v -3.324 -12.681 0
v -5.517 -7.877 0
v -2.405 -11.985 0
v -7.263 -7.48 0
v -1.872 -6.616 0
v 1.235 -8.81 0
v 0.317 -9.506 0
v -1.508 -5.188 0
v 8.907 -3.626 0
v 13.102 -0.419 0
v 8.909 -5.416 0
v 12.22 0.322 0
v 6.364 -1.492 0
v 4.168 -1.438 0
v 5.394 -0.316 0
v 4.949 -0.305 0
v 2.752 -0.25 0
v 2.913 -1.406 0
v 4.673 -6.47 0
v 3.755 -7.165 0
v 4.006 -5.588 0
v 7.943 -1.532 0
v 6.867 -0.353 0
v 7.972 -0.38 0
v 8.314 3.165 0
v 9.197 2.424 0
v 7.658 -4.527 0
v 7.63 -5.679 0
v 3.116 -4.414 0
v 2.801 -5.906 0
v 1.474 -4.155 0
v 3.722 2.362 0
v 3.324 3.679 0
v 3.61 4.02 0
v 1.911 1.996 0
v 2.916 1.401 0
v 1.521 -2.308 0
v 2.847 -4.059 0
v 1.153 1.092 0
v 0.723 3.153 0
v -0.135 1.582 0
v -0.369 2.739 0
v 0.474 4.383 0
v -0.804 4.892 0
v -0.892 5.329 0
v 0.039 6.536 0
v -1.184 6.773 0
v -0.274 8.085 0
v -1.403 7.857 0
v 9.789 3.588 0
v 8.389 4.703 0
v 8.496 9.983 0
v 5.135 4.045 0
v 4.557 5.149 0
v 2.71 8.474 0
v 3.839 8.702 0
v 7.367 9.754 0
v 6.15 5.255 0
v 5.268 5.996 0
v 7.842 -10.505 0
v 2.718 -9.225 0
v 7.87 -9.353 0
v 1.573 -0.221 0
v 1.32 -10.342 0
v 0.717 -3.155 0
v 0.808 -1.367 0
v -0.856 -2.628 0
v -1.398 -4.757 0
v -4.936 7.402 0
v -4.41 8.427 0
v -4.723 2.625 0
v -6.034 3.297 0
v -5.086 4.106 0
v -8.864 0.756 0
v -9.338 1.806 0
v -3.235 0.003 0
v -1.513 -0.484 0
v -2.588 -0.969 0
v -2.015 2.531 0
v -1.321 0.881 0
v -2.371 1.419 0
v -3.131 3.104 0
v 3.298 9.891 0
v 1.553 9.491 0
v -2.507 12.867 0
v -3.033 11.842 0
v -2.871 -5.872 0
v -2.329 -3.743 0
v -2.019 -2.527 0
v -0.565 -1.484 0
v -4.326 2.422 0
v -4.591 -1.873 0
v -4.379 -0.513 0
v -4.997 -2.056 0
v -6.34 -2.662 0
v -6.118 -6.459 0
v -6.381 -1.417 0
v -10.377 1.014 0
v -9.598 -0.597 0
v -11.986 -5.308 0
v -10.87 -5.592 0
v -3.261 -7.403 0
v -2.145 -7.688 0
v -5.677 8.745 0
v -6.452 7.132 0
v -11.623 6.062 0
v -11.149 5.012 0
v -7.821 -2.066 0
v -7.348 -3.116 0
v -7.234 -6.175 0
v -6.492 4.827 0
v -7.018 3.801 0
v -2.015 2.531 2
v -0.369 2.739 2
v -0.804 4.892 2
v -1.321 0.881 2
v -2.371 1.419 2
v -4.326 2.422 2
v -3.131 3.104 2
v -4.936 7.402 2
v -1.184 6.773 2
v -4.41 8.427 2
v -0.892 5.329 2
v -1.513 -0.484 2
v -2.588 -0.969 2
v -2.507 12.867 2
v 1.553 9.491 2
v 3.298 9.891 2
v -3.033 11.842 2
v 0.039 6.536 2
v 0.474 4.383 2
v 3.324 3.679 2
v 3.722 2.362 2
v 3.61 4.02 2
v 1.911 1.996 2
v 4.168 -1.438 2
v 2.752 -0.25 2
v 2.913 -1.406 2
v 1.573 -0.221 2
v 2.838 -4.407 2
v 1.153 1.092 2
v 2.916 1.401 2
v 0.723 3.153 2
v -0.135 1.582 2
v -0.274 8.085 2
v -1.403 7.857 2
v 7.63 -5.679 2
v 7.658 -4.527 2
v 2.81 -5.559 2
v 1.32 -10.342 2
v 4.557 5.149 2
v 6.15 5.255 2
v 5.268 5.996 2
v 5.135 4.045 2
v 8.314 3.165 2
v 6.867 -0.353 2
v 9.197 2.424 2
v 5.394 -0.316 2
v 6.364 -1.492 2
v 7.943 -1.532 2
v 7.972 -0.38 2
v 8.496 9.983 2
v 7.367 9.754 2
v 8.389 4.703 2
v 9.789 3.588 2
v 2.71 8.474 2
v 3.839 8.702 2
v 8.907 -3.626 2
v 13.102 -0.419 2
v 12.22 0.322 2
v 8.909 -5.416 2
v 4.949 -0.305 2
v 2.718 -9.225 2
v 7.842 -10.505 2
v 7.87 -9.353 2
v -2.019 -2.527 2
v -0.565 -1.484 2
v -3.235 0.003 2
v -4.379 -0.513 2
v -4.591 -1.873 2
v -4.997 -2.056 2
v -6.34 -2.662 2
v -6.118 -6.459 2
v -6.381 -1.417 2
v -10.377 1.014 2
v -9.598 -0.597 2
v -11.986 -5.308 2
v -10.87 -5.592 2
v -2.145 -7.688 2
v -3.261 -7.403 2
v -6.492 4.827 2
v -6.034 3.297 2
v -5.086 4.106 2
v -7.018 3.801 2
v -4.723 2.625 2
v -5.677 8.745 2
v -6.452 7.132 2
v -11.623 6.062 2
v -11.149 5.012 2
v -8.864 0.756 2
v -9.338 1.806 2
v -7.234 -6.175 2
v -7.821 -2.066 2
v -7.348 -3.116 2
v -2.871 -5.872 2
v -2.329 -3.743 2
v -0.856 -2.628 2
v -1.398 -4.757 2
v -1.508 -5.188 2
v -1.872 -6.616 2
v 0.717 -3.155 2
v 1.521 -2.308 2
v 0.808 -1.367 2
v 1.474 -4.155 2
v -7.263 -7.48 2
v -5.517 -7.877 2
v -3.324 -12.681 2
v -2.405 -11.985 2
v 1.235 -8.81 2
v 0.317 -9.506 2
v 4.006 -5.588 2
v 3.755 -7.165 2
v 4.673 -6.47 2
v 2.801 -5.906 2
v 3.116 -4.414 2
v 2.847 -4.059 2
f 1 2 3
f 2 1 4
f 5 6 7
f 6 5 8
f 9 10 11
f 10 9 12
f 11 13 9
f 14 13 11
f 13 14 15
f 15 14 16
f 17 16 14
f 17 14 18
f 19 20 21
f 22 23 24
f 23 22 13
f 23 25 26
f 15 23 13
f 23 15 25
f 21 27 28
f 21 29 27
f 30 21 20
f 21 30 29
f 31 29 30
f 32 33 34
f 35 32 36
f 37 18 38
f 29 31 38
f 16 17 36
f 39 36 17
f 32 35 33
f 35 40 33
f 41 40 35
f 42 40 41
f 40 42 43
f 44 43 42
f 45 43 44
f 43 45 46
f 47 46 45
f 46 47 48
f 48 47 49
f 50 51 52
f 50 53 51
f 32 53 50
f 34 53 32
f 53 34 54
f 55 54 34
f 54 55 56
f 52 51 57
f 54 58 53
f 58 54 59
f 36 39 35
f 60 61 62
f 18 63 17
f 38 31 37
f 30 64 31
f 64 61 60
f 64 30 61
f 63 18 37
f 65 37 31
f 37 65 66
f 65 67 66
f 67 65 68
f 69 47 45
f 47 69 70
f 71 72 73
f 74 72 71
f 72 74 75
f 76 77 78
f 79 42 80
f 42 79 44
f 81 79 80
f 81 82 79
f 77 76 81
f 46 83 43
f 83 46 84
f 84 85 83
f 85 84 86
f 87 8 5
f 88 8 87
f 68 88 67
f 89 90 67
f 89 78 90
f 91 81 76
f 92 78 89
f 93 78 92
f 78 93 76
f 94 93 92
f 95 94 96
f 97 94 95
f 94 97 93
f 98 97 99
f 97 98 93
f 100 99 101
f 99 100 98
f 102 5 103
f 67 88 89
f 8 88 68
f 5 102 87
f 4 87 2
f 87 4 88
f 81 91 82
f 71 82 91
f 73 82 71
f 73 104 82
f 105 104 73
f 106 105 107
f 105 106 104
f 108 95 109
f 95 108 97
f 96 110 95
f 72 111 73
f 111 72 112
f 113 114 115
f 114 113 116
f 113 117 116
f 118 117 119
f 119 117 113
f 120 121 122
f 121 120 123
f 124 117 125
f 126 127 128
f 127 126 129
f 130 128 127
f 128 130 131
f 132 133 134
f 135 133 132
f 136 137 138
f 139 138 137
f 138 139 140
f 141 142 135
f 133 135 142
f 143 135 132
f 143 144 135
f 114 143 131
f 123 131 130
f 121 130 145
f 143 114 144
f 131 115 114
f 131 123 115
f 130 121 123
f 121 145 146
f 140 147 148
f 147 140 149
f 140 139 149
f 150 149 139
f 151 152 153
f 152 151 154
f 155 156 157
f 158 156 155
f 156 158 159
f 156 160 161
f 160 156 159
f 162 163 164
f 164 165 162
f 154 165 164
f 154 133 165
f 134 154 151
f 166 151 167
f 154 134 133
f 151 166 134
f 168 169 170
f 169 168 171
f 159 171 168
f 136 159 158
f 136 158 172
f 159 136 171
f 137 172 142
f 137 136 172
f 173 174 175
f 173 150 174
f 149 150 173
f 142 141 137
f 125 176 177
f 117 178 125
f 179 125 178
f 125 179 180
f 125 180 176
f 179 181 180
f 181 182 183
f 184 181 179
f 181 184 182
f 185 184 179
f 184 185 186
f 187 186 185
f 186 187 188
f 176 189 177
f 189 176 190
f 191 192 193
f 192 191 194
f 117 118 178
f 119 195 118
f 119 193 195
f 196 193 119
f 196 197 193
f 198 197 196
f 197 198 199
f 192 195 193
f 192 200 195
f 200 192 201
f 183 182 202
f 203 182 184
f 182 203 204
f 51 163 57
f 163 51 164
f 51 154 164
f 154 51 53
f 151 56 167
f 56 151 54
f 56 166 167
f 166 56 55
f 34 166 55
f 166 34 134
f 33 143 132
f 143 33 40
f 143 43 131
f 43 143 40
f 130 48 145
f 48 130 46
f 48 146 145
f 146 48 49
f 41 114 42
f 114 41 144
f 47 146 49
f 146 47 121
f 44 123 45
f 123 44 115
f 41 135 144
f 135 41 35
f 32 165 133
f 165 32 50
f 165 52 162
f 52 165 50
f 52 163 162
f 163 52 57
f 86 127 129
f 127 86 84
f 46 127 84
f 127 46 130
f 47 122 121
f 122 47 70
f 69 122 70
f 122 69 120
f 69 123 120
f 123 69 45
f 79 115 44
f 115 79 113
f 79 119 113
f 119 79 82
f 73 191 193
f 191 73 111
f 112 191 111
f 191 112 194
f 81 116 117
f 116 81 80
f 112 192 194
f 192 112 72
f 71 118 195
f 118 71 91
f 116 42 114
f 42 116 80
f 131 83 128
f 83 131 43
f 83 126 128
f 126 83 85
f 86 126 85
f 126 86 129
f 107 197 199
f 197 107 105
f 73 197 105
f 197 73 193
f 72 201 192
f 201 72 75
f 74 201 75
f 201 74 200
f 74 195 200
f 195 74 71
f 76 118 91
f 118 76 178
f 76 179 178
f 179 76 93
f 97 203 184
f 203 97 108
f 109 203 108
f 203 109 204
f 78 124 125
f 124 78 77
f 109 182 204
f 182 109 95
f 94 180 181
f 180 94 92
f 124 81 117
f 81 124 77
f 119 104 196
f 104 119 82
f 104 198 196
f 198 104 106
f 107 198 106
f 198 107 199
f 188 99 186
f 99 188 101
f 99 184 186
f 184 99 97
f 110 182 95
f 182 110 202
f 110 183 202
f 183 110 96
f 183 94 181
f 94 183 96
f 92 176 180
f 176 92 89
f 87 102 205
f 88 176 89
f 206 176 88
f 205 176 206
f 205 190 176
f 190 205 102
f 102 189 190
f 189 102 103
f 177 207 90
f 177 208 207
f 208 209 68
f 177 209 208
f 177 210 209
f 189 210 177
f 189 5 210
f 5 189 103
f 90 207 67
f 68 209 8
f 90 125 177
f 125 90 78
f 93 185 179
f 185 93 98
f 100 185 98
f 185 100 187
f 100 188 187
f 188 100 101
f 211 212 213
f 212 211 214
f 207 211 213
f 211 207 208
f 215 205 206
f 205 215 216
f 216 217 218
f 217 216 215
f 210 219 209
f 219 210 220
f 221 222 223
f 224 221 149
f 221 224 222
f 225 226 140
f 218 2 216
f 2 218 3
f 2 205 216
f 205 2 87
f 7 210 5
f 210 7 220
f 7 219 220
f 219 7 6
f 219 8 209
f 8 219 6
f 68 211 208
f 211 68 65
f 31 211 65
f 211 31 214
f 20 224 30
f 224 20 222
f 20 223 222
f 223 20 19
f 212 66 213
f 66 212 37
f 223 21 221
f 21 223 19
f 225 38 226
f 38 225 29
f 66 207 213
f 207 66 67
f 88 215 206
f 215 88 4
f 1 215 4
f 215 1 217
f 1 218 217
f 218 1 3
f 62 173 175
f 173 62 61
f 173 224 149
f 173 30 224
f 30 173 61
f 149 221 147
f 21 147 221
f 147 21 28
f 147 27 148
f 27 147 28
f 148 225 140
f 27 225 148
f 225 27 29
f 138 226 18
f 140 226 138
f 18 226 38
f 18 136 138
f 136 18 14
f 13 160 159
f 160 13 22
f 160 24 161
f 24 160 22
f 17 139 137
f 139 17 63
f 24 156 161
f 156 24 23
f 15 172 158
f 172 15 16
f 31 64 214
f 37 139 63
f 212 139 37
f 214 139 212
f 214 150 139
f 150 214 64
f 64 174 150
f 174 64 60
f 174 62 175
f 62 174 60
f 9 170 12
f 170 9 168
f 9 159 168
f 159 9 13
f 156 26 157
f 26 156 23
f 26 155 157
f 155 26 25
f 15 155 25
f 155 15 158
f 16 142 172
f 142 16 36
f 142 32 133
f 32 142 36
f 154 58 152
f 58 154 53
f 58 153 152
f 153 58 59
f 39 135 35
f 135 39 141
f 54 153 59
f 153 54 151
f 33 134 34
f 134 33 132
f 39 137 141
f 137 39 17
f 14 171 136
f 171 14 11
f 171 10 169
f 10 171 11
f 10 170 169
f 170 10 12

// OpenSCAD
// use your initial(s)
text_to_use = "E";

// how many times your letter(s) should be used - the more parts, the more innerspace you will need!
parts = 7; // [1:36]
rotation = 360/parts;

// how thick should it be?
thickness = 2; // [1:10]

// move the letters to/from the inner point
inner_space = 70; // [-100:200]

// rotate the letters - try at least 0 and 90
inner_rotate = 50; // [-180:180]

// what font do you like? https://fonts.google.com/
fonttype = "Miltonian"; // [ABeeZee, Abel, Abhaya Libre, Abril Fatface, Aclonica, Acme, Actor, Adamina, Advent Pro, Aguafina Script, Akronim, Aladin, Aldrich, Alef, Alegreya, Alegreya Sans, Alegreya Sans SC, Alegreya SC, Alex Brush, Alfa Slab One, Alice, Alike, Alike Angular, Allan, Allerta, Allerta Stencil, Allura, Almendra, Almendra Display, Almendra SC, Amarante, Amaranth, Amatic SC, Amatica SC, Amethysta, Amiko, Amiri, Amita, Anaheim, Andada, Andika, Angkor, Annie Use Your Telescope, Anonymous Pro, Antic, Antic Didone, Antic Slab, Anton, Arapey, Arbutus, Arbutus Slab, Architects Daughter, Archivo, Archivo Black, Archivo Narrow, Aref Ruqaa, Arima Madurai, Arimo, Arizonia, Armata, Arsenal, Artifika, Arvo, Arya, Asap, Asap Condensed, Asar, Asset, Assistant, Astloch, Asul, Athiti, Atma, Atomic Age, Aubrey, Audiowide, Autour One, Average, Average Sans, Averia Gruesa Libre, Averia Libre, Averia Sans Libre, Averia Serif Libre, Bad Script, Bahiana, Baloo, Baloo Bhai, Baloo Bhaijaan, Baloo Bhaina, Baloo Chettan, Baloo Da, Baloo Paaji, Baloo Tamma, Baloo Tammudu, Baloo Thambi, Balthazar, Bangers, Barrio, Basic, Battambang, Baumans, Bayon, Belgrano, Bellefair, Belleza, BenchNine, Bentham, Berkshire Swash, Bevan, Bigelow Rules, Bigshot One, Bilbo, Bilbo Swash Caps, BioRhyme, BioRhyme Expanded, Biryani, Bitter, Black Ops One, Bokor, Bonbon, Boogaloo, Bowlby One, Bowlby One SC, Brawler, Bree Serif, Bubblegum Sans, Bubbler One, Buda, Buenard, Bungee, Bungee Hairline, Bungee Inline, Bungee Outline, Bungee Shade, Butcherman, Butterfly Kids, Cabin, Cabin Condensed, Cabin Sketch, Caesar Dressing, Cagliostro, Cairo, Calligraffitti, Cambay, Cambo, Candal, Cantarell, Cantata One, Cantora One, Capriola, Cardo, Carme, Carrois Gothic, Carrois Gothic SC, Carter One, Catamaran, Caudex, Caveat, Caveat Brush, Cedarville Cursive, Ceviche One, Changa, Changa One, Chango, Chathura, Chau Philomene One, Chela One, Chelsea Market, Chenla, Cherry Cream Soda, Cherry Swash, Chewy, Chicle, Chivo, Chonburi, Cinzel, Cinzel Decorative, Clicker Script, Coda, Coda Caption, Codystar, Coiny, Combo, Comfortaa, Coming Soon, Concert One, Condiment, Content, Contrail One, Convergence, Cookie, Copse, Corben, Cormorant, Cormorant Garamond, Cormorant Infant, Cormorant SC, Cormorant Unicase, Cormorant Upright, Courgette, Cousine, Coustard, Covered By Your Grace, Crafty Girls, Creepster, Crete Round, Crimson Text, Croissant One, Crushed, Cuprum, Cutive, Cutive Mono, Damion, Dancing Script, Dangrek, David Libre, Dawning of a New Day, Days One, Dekko, Delius, Delius Swash Caps, Delius Unicase, Della Respira, Denk One, Devonshire, Dhurjati, Didact Gothic, Diplomata, Diplomata SC, Domine, Donegal One, Doppio One, Dorsa, Dosis, Dr Sugiyama, Droid Sans, Droid Sans Mono, Droid Serif, Duru Sans, Dynalight, Eagle Lake, Eater, EB Garamond, Economica, Eczar, El Messiri, Electrolize, Elsie, Elsie Swash Caps, Emblema One, Emilys Candy, Encode Sans, Encode Sans Condensed, Encode Sans Expanded, Encode Sans Semi Condensed, Encode Sans Semi Expanded, Engagement, Englebert, Enriqueta, Erica One, Esteban, Euphoria Script, Ewert, Exo, Exo 2, Expletus Sans, Fanwood Text, Farsan, Fascinate, Fascinate Inline, Faster One, Fasthand, Fauna One, Faustina, Federant, Federo, Felipa, Fenix, Finger Paint, Fira Mono, Fira Sans, Fira Sans Condensed, Fira Sans Extra Condensed, Fjalla One, Fjord One, Flamenco, Flavors, Fondamento, Fontdiner Swanky, Forum, Francois One, Frank Ruhl Libre, Freckle Face, Fredericka the Great, Fredoka One, Freehand, Fresca, Frijole, Fruktur, Fugaz One, Gabriela, Gafata, Galada, Galdeano, Galindo, Gentium Basic, Gentium Book Basic, Geo, Geostar, Geostar Fill, Germania One, GFS Didot, GFS Neohellenic, Gidugu, Gilda Display, Give You Glory, Glass Antiqua, Glegoo, Gloria Hallelujah, Goblin One, Gochi Hand, Gorditas, Goudy Bookletter 1911, Graduate, Grand Hotel, Gravitas One, Great Vibes, Griffy, Gruppo, Gudea, Gurajada, Habibi, Halant, Hammersmith One, Hanalei, Hanalei Fill, Handlee, Hanuman, Happy Monkey, Harmattan, Headland One, Heebo, Henny Penny, Herr Von Muellerhoff, Hind, Hind Guntur, Hind Madurai, Hind Siliguri, Hind Vadodara, Holtwood One SC, Homemade Apple, Homenaje, Iceberg, Iceland, IM Fell Double Pica, IM Fell Double Pica SC, IM Fell DW Pica, IM Fell DW Pica SC, IM Fell English, IM Fell English SC, IM Fell French Canon, IM Fell French Canon SC, IM Fell Great Primer, IM Fell Great Primer SC, Imprima, Inconsolata, Inder, Indie Flower, Inika, Inknut Antiqua, Irish Grover, Istok Web, Italiana, Italianno, Itim, Jacques Francois, Jacques Francois Shadow, Jaldi, Jim Nightshade, Jockey One, Jolly Lodger, Jomhuria, Josefin Sans, Josefin Slab, Joti One, Judson, Julee, Julius Sans One, Junge, Jura, Just Another Hand, Just Me Again Down Here, Kadwa, Kalam, Kameron, Kanit, Kantumruy, Karla, Karma, Katibeh, Kaushan Script, Kavivanar, Kavoon, Kdam Thmor, Keania One, Kelly Slab, Kenia, Khand, Khmer, Khula, Kite One, Knewave, Kotta One, Koulen, Kranky, Kreon, Kristi, Krona One, Kumar One, Kumar One Outline, Kurale, La Belle Aurore, Laila, Lakki Reddy, Lalezar, Lancelot, Lateef, Lato, League Script, Leckerli One, Ledger, Lekton, Lemon, Lemonada, Libre Barcode 128, Libre Barcode 128 Text, Libre Barcode 39, Libre Barcode 39 Extended, Libre Barcode 39 Extended Text, Libre Barcode 39 Text, Libre Baskerville, Libre Franklin, Life Savers, Lilita One, Lily Script One, Limelight, Linden Hill, Lobster, Lobster Two, Londrina Outline, Londrina Shadow, Londrina Sketch, Londrina Solid, Lora, Love Ya Like A Sister, Loved by the King, Lovers Quarrel, Luckiest Guy, Lusitana, Lustria, Macondo, Macondo Swash Caps, Mada, Magra, Maiden Orange, Maitree, Mako, Mallanna, Mandali, Manuale, Marcellus, Marcellus SC, Marck Script, Margarine, Marko One, Marmelad, Martel, Martel Sans, Marvel, Mate, Mate SC, Maven Pro, McLaren, Meddon, MedievalSharp, Medula One, Meera Inimai, Megrim, Meie Script, Merienda, Merienda One, Merriweather, Merriweather Sans, Metal, Metal Mania, Metamorphous, Metrophobic, Michroma, Milonga, Miltonian, Miltonian Tattoo, Miniver, Miriam Libre, Mirza, Miss Fajardose, Mitr, Modak, Modern Antiqua, Mogra, Molengo, Molle, Monda, Monofett, Monoton, Monsieur La Doulaise, Montaga, Montez, Montserrat, Montserrat Alternates, Montserrat Subrayada, Moul, Moulpali, Mountains of Christmas, Mouse Memoirs, Mr Bedfort, Mr Dafoe, Mr De Haviland, Mrs Saint Delafield, Mrs Sheppards, Mukta, Mukta Mahee, Mukta Malar, Mukta Vaani, Muli, Mystery Quest, Neucha, Neuton, New Rocker, News Cycle, Niconne, Nixie One, Nobile, Nokora, Norican, Nosifer, Nothing You Could Do, Noticia Text, Noto Sans, Noto Serif, Nova Cut, Nova Flat, Nova Mono, Nova Oval, Nova Round, Nova Script, Nova Slim, Nova Square, NTR, Numans, Nunito, Nunito Sans, Odor Mean Chey, Offside, Old Standard TT, Oldenburg, Oleo Script, Oleo Script Swash Caps, Open Sans, Open Sans Condensed, Oranienbaum, Orbitron, Oregano, Orienta, Original Surfer, Oswald, Over the Rainbow, Overlock, Overlock SC, Overpass, Overpass Mono, Ovo, Oxygen, Oxygen Mono, Pacifico, Padauk, Palanquin, Palanquin Dark, Pangolin, Paprika, Parisienne, Passero One, Passion One, Pathway Gothic One, Patrick Hand, Patrick Hand SC, Pattaya, Patua One, Pavanam, Paytone One, Peddana, Peralta, Permanent Marker, Petit Formal Script, Petrona, Philosopher, Piedra, Pinyon Script, Pirata One, Plaster, Play, Playball, Playfair Display, Playfair Display SC, Podkova, Poiret One, Poller One, Poly, Pompiere, Pontano Sans, Poppins, Port Lligat Sans, Port Lligat Slab, Pragati Narrow, Prata, Preahvihear, Press Start 2P, Pridi, Princess Sofia, Prociono, Prompt, Prosto One, Proza Libre, PT Mono, PT Sans, PT Sans Caption, PT Sans Narrow, PT Serif, PT Serif Caption, Puritan, Purple Purse, Quando, Quantico, Quattrocento, Quattrocento Sans, Questrial, Quicksand, Quintessential, Qwigley, Racing Sans One, Radley, Rajdhani, Rakkas, Raleway, Raleway Dots, Ramabhadra, Ramaraja, Rambla, Rammetto One, Ranchers, Rancho, Ranga, Rasa, Rationale, Ravi Prakash, Redressed, Reem Kufi, Reenie Beanie, Revalia, Rhodium Libre, Ribeye, Ribeye Marrow, Righteous, Risque, Roboto, Roboto Condensed, Roboto Mono, Roboto Slab, Rochester, Rock Salt, Rokkitt, Romanesco, Ropa Sans, Rosario, Rosarivo, Rouge Script, Rozha One, Rubik, Rubik Mono One, Ruda, Rufina, Ruge Boogie, Ruluko, Rum Raisin, Ruslan Display, Russo One, Ruthie, Rye, Sacramento, Sahitya, Sail, Saira, Saira Condensed, Saira Extra Condensed, Saira Semi Condensed, Salsa, Sanchez, Sancreek, Sansita, Sarala, Sarina, Sarpanch, Satisfy, Scada, Scheherazade, Schoolbell, Scope One, Seaweed Script, Secular One, Sedgwick Ave, Sedgwick Ave Display, Sevillana, Seymour One, Shadows Into Light, Shadows Into Light Two, Shanti, Share, Share Tech, Share Tech Mono, Shojumaru, Short Stack, Shrikhand, Siemreap, Sigmar One, Signika, Signika Negative, Simonetta, Sintony, Sirin Stencil, Six Caps, Skranji, Slabo 13px, Slabo 27px, Slackey, Smokum, Smythe, Sniglet, Snippet, Snowburst One, Sofadi One, Sofia, Sonsie One, Sorts Mill Goudy, Source Code Pro, Source Sans Pro, Source Serif Pro, Space Mono, Special Elite, Spectral, Spicy Rice, Spinnaker, Spirax, Squada One, Sree Krushnadevaraya, Sriracha, Stalemate, Stalinist One, Stardos Stencil, Stint Ultra Condensed, Stint Ultra Expanded, Stoke, Strait, Sue Ellen Francisco, Suez One, Sumana, Sunshiney, Supermercado One, Sura, Suranna, Suravaram, Suwannaphum, Swanky and Moo Moo, Syncopate, Tangerine, Taprom, Tauri, Taviraj, Teko, Telex, Tenali Ramakrishna, Tenor Sans, Text Me One, The Girl Next Door, Tienne, Tillana, Timmana, Tinos, Titan One, Titillium Web, Trade Winds, Trirong, Trocchi, Trochut, Trykker, Tulpen One, Ubuntu, Ubuntu Condensed, Ubuntu Mono, Ultra, Uncial Antiqua, Underdog, Unica One, UnifrakturCook, UnifrakturMaguntia, Unkempt, Unlock, Unna, Vampiro One, Varela, Varela Round, Vast Shadow, Vesper Libre, Vibur, Vidaloka, Viga, Voces, Volkhov, Vollkorn, Voltaire, VT323, Waiting for the Sunrise, Wallpoet, Walter Turncoat, Warnes, Wellfleet, Wendy One, Wire One, Work Sans, Yanone Kaffeesatz, Yantramanav, Yatra One, Yellowtail, Yeseva One, Yesteryear, Yrsa, Zeyada, Zilla Slab, Zilla Slab Highlight]


module print_part() {
    for (i=[1:parts]) {
        rotate(rotation*i) single();
    }
}

module single() {
    linear_extrude(height = thickness) {
        translate([inner_space/10,0,0]) rotate(inner_rotate) text(text_to_use, valign="center", halign="center", font = fonttype);
    }
}

$fn = 100;
print_part();
